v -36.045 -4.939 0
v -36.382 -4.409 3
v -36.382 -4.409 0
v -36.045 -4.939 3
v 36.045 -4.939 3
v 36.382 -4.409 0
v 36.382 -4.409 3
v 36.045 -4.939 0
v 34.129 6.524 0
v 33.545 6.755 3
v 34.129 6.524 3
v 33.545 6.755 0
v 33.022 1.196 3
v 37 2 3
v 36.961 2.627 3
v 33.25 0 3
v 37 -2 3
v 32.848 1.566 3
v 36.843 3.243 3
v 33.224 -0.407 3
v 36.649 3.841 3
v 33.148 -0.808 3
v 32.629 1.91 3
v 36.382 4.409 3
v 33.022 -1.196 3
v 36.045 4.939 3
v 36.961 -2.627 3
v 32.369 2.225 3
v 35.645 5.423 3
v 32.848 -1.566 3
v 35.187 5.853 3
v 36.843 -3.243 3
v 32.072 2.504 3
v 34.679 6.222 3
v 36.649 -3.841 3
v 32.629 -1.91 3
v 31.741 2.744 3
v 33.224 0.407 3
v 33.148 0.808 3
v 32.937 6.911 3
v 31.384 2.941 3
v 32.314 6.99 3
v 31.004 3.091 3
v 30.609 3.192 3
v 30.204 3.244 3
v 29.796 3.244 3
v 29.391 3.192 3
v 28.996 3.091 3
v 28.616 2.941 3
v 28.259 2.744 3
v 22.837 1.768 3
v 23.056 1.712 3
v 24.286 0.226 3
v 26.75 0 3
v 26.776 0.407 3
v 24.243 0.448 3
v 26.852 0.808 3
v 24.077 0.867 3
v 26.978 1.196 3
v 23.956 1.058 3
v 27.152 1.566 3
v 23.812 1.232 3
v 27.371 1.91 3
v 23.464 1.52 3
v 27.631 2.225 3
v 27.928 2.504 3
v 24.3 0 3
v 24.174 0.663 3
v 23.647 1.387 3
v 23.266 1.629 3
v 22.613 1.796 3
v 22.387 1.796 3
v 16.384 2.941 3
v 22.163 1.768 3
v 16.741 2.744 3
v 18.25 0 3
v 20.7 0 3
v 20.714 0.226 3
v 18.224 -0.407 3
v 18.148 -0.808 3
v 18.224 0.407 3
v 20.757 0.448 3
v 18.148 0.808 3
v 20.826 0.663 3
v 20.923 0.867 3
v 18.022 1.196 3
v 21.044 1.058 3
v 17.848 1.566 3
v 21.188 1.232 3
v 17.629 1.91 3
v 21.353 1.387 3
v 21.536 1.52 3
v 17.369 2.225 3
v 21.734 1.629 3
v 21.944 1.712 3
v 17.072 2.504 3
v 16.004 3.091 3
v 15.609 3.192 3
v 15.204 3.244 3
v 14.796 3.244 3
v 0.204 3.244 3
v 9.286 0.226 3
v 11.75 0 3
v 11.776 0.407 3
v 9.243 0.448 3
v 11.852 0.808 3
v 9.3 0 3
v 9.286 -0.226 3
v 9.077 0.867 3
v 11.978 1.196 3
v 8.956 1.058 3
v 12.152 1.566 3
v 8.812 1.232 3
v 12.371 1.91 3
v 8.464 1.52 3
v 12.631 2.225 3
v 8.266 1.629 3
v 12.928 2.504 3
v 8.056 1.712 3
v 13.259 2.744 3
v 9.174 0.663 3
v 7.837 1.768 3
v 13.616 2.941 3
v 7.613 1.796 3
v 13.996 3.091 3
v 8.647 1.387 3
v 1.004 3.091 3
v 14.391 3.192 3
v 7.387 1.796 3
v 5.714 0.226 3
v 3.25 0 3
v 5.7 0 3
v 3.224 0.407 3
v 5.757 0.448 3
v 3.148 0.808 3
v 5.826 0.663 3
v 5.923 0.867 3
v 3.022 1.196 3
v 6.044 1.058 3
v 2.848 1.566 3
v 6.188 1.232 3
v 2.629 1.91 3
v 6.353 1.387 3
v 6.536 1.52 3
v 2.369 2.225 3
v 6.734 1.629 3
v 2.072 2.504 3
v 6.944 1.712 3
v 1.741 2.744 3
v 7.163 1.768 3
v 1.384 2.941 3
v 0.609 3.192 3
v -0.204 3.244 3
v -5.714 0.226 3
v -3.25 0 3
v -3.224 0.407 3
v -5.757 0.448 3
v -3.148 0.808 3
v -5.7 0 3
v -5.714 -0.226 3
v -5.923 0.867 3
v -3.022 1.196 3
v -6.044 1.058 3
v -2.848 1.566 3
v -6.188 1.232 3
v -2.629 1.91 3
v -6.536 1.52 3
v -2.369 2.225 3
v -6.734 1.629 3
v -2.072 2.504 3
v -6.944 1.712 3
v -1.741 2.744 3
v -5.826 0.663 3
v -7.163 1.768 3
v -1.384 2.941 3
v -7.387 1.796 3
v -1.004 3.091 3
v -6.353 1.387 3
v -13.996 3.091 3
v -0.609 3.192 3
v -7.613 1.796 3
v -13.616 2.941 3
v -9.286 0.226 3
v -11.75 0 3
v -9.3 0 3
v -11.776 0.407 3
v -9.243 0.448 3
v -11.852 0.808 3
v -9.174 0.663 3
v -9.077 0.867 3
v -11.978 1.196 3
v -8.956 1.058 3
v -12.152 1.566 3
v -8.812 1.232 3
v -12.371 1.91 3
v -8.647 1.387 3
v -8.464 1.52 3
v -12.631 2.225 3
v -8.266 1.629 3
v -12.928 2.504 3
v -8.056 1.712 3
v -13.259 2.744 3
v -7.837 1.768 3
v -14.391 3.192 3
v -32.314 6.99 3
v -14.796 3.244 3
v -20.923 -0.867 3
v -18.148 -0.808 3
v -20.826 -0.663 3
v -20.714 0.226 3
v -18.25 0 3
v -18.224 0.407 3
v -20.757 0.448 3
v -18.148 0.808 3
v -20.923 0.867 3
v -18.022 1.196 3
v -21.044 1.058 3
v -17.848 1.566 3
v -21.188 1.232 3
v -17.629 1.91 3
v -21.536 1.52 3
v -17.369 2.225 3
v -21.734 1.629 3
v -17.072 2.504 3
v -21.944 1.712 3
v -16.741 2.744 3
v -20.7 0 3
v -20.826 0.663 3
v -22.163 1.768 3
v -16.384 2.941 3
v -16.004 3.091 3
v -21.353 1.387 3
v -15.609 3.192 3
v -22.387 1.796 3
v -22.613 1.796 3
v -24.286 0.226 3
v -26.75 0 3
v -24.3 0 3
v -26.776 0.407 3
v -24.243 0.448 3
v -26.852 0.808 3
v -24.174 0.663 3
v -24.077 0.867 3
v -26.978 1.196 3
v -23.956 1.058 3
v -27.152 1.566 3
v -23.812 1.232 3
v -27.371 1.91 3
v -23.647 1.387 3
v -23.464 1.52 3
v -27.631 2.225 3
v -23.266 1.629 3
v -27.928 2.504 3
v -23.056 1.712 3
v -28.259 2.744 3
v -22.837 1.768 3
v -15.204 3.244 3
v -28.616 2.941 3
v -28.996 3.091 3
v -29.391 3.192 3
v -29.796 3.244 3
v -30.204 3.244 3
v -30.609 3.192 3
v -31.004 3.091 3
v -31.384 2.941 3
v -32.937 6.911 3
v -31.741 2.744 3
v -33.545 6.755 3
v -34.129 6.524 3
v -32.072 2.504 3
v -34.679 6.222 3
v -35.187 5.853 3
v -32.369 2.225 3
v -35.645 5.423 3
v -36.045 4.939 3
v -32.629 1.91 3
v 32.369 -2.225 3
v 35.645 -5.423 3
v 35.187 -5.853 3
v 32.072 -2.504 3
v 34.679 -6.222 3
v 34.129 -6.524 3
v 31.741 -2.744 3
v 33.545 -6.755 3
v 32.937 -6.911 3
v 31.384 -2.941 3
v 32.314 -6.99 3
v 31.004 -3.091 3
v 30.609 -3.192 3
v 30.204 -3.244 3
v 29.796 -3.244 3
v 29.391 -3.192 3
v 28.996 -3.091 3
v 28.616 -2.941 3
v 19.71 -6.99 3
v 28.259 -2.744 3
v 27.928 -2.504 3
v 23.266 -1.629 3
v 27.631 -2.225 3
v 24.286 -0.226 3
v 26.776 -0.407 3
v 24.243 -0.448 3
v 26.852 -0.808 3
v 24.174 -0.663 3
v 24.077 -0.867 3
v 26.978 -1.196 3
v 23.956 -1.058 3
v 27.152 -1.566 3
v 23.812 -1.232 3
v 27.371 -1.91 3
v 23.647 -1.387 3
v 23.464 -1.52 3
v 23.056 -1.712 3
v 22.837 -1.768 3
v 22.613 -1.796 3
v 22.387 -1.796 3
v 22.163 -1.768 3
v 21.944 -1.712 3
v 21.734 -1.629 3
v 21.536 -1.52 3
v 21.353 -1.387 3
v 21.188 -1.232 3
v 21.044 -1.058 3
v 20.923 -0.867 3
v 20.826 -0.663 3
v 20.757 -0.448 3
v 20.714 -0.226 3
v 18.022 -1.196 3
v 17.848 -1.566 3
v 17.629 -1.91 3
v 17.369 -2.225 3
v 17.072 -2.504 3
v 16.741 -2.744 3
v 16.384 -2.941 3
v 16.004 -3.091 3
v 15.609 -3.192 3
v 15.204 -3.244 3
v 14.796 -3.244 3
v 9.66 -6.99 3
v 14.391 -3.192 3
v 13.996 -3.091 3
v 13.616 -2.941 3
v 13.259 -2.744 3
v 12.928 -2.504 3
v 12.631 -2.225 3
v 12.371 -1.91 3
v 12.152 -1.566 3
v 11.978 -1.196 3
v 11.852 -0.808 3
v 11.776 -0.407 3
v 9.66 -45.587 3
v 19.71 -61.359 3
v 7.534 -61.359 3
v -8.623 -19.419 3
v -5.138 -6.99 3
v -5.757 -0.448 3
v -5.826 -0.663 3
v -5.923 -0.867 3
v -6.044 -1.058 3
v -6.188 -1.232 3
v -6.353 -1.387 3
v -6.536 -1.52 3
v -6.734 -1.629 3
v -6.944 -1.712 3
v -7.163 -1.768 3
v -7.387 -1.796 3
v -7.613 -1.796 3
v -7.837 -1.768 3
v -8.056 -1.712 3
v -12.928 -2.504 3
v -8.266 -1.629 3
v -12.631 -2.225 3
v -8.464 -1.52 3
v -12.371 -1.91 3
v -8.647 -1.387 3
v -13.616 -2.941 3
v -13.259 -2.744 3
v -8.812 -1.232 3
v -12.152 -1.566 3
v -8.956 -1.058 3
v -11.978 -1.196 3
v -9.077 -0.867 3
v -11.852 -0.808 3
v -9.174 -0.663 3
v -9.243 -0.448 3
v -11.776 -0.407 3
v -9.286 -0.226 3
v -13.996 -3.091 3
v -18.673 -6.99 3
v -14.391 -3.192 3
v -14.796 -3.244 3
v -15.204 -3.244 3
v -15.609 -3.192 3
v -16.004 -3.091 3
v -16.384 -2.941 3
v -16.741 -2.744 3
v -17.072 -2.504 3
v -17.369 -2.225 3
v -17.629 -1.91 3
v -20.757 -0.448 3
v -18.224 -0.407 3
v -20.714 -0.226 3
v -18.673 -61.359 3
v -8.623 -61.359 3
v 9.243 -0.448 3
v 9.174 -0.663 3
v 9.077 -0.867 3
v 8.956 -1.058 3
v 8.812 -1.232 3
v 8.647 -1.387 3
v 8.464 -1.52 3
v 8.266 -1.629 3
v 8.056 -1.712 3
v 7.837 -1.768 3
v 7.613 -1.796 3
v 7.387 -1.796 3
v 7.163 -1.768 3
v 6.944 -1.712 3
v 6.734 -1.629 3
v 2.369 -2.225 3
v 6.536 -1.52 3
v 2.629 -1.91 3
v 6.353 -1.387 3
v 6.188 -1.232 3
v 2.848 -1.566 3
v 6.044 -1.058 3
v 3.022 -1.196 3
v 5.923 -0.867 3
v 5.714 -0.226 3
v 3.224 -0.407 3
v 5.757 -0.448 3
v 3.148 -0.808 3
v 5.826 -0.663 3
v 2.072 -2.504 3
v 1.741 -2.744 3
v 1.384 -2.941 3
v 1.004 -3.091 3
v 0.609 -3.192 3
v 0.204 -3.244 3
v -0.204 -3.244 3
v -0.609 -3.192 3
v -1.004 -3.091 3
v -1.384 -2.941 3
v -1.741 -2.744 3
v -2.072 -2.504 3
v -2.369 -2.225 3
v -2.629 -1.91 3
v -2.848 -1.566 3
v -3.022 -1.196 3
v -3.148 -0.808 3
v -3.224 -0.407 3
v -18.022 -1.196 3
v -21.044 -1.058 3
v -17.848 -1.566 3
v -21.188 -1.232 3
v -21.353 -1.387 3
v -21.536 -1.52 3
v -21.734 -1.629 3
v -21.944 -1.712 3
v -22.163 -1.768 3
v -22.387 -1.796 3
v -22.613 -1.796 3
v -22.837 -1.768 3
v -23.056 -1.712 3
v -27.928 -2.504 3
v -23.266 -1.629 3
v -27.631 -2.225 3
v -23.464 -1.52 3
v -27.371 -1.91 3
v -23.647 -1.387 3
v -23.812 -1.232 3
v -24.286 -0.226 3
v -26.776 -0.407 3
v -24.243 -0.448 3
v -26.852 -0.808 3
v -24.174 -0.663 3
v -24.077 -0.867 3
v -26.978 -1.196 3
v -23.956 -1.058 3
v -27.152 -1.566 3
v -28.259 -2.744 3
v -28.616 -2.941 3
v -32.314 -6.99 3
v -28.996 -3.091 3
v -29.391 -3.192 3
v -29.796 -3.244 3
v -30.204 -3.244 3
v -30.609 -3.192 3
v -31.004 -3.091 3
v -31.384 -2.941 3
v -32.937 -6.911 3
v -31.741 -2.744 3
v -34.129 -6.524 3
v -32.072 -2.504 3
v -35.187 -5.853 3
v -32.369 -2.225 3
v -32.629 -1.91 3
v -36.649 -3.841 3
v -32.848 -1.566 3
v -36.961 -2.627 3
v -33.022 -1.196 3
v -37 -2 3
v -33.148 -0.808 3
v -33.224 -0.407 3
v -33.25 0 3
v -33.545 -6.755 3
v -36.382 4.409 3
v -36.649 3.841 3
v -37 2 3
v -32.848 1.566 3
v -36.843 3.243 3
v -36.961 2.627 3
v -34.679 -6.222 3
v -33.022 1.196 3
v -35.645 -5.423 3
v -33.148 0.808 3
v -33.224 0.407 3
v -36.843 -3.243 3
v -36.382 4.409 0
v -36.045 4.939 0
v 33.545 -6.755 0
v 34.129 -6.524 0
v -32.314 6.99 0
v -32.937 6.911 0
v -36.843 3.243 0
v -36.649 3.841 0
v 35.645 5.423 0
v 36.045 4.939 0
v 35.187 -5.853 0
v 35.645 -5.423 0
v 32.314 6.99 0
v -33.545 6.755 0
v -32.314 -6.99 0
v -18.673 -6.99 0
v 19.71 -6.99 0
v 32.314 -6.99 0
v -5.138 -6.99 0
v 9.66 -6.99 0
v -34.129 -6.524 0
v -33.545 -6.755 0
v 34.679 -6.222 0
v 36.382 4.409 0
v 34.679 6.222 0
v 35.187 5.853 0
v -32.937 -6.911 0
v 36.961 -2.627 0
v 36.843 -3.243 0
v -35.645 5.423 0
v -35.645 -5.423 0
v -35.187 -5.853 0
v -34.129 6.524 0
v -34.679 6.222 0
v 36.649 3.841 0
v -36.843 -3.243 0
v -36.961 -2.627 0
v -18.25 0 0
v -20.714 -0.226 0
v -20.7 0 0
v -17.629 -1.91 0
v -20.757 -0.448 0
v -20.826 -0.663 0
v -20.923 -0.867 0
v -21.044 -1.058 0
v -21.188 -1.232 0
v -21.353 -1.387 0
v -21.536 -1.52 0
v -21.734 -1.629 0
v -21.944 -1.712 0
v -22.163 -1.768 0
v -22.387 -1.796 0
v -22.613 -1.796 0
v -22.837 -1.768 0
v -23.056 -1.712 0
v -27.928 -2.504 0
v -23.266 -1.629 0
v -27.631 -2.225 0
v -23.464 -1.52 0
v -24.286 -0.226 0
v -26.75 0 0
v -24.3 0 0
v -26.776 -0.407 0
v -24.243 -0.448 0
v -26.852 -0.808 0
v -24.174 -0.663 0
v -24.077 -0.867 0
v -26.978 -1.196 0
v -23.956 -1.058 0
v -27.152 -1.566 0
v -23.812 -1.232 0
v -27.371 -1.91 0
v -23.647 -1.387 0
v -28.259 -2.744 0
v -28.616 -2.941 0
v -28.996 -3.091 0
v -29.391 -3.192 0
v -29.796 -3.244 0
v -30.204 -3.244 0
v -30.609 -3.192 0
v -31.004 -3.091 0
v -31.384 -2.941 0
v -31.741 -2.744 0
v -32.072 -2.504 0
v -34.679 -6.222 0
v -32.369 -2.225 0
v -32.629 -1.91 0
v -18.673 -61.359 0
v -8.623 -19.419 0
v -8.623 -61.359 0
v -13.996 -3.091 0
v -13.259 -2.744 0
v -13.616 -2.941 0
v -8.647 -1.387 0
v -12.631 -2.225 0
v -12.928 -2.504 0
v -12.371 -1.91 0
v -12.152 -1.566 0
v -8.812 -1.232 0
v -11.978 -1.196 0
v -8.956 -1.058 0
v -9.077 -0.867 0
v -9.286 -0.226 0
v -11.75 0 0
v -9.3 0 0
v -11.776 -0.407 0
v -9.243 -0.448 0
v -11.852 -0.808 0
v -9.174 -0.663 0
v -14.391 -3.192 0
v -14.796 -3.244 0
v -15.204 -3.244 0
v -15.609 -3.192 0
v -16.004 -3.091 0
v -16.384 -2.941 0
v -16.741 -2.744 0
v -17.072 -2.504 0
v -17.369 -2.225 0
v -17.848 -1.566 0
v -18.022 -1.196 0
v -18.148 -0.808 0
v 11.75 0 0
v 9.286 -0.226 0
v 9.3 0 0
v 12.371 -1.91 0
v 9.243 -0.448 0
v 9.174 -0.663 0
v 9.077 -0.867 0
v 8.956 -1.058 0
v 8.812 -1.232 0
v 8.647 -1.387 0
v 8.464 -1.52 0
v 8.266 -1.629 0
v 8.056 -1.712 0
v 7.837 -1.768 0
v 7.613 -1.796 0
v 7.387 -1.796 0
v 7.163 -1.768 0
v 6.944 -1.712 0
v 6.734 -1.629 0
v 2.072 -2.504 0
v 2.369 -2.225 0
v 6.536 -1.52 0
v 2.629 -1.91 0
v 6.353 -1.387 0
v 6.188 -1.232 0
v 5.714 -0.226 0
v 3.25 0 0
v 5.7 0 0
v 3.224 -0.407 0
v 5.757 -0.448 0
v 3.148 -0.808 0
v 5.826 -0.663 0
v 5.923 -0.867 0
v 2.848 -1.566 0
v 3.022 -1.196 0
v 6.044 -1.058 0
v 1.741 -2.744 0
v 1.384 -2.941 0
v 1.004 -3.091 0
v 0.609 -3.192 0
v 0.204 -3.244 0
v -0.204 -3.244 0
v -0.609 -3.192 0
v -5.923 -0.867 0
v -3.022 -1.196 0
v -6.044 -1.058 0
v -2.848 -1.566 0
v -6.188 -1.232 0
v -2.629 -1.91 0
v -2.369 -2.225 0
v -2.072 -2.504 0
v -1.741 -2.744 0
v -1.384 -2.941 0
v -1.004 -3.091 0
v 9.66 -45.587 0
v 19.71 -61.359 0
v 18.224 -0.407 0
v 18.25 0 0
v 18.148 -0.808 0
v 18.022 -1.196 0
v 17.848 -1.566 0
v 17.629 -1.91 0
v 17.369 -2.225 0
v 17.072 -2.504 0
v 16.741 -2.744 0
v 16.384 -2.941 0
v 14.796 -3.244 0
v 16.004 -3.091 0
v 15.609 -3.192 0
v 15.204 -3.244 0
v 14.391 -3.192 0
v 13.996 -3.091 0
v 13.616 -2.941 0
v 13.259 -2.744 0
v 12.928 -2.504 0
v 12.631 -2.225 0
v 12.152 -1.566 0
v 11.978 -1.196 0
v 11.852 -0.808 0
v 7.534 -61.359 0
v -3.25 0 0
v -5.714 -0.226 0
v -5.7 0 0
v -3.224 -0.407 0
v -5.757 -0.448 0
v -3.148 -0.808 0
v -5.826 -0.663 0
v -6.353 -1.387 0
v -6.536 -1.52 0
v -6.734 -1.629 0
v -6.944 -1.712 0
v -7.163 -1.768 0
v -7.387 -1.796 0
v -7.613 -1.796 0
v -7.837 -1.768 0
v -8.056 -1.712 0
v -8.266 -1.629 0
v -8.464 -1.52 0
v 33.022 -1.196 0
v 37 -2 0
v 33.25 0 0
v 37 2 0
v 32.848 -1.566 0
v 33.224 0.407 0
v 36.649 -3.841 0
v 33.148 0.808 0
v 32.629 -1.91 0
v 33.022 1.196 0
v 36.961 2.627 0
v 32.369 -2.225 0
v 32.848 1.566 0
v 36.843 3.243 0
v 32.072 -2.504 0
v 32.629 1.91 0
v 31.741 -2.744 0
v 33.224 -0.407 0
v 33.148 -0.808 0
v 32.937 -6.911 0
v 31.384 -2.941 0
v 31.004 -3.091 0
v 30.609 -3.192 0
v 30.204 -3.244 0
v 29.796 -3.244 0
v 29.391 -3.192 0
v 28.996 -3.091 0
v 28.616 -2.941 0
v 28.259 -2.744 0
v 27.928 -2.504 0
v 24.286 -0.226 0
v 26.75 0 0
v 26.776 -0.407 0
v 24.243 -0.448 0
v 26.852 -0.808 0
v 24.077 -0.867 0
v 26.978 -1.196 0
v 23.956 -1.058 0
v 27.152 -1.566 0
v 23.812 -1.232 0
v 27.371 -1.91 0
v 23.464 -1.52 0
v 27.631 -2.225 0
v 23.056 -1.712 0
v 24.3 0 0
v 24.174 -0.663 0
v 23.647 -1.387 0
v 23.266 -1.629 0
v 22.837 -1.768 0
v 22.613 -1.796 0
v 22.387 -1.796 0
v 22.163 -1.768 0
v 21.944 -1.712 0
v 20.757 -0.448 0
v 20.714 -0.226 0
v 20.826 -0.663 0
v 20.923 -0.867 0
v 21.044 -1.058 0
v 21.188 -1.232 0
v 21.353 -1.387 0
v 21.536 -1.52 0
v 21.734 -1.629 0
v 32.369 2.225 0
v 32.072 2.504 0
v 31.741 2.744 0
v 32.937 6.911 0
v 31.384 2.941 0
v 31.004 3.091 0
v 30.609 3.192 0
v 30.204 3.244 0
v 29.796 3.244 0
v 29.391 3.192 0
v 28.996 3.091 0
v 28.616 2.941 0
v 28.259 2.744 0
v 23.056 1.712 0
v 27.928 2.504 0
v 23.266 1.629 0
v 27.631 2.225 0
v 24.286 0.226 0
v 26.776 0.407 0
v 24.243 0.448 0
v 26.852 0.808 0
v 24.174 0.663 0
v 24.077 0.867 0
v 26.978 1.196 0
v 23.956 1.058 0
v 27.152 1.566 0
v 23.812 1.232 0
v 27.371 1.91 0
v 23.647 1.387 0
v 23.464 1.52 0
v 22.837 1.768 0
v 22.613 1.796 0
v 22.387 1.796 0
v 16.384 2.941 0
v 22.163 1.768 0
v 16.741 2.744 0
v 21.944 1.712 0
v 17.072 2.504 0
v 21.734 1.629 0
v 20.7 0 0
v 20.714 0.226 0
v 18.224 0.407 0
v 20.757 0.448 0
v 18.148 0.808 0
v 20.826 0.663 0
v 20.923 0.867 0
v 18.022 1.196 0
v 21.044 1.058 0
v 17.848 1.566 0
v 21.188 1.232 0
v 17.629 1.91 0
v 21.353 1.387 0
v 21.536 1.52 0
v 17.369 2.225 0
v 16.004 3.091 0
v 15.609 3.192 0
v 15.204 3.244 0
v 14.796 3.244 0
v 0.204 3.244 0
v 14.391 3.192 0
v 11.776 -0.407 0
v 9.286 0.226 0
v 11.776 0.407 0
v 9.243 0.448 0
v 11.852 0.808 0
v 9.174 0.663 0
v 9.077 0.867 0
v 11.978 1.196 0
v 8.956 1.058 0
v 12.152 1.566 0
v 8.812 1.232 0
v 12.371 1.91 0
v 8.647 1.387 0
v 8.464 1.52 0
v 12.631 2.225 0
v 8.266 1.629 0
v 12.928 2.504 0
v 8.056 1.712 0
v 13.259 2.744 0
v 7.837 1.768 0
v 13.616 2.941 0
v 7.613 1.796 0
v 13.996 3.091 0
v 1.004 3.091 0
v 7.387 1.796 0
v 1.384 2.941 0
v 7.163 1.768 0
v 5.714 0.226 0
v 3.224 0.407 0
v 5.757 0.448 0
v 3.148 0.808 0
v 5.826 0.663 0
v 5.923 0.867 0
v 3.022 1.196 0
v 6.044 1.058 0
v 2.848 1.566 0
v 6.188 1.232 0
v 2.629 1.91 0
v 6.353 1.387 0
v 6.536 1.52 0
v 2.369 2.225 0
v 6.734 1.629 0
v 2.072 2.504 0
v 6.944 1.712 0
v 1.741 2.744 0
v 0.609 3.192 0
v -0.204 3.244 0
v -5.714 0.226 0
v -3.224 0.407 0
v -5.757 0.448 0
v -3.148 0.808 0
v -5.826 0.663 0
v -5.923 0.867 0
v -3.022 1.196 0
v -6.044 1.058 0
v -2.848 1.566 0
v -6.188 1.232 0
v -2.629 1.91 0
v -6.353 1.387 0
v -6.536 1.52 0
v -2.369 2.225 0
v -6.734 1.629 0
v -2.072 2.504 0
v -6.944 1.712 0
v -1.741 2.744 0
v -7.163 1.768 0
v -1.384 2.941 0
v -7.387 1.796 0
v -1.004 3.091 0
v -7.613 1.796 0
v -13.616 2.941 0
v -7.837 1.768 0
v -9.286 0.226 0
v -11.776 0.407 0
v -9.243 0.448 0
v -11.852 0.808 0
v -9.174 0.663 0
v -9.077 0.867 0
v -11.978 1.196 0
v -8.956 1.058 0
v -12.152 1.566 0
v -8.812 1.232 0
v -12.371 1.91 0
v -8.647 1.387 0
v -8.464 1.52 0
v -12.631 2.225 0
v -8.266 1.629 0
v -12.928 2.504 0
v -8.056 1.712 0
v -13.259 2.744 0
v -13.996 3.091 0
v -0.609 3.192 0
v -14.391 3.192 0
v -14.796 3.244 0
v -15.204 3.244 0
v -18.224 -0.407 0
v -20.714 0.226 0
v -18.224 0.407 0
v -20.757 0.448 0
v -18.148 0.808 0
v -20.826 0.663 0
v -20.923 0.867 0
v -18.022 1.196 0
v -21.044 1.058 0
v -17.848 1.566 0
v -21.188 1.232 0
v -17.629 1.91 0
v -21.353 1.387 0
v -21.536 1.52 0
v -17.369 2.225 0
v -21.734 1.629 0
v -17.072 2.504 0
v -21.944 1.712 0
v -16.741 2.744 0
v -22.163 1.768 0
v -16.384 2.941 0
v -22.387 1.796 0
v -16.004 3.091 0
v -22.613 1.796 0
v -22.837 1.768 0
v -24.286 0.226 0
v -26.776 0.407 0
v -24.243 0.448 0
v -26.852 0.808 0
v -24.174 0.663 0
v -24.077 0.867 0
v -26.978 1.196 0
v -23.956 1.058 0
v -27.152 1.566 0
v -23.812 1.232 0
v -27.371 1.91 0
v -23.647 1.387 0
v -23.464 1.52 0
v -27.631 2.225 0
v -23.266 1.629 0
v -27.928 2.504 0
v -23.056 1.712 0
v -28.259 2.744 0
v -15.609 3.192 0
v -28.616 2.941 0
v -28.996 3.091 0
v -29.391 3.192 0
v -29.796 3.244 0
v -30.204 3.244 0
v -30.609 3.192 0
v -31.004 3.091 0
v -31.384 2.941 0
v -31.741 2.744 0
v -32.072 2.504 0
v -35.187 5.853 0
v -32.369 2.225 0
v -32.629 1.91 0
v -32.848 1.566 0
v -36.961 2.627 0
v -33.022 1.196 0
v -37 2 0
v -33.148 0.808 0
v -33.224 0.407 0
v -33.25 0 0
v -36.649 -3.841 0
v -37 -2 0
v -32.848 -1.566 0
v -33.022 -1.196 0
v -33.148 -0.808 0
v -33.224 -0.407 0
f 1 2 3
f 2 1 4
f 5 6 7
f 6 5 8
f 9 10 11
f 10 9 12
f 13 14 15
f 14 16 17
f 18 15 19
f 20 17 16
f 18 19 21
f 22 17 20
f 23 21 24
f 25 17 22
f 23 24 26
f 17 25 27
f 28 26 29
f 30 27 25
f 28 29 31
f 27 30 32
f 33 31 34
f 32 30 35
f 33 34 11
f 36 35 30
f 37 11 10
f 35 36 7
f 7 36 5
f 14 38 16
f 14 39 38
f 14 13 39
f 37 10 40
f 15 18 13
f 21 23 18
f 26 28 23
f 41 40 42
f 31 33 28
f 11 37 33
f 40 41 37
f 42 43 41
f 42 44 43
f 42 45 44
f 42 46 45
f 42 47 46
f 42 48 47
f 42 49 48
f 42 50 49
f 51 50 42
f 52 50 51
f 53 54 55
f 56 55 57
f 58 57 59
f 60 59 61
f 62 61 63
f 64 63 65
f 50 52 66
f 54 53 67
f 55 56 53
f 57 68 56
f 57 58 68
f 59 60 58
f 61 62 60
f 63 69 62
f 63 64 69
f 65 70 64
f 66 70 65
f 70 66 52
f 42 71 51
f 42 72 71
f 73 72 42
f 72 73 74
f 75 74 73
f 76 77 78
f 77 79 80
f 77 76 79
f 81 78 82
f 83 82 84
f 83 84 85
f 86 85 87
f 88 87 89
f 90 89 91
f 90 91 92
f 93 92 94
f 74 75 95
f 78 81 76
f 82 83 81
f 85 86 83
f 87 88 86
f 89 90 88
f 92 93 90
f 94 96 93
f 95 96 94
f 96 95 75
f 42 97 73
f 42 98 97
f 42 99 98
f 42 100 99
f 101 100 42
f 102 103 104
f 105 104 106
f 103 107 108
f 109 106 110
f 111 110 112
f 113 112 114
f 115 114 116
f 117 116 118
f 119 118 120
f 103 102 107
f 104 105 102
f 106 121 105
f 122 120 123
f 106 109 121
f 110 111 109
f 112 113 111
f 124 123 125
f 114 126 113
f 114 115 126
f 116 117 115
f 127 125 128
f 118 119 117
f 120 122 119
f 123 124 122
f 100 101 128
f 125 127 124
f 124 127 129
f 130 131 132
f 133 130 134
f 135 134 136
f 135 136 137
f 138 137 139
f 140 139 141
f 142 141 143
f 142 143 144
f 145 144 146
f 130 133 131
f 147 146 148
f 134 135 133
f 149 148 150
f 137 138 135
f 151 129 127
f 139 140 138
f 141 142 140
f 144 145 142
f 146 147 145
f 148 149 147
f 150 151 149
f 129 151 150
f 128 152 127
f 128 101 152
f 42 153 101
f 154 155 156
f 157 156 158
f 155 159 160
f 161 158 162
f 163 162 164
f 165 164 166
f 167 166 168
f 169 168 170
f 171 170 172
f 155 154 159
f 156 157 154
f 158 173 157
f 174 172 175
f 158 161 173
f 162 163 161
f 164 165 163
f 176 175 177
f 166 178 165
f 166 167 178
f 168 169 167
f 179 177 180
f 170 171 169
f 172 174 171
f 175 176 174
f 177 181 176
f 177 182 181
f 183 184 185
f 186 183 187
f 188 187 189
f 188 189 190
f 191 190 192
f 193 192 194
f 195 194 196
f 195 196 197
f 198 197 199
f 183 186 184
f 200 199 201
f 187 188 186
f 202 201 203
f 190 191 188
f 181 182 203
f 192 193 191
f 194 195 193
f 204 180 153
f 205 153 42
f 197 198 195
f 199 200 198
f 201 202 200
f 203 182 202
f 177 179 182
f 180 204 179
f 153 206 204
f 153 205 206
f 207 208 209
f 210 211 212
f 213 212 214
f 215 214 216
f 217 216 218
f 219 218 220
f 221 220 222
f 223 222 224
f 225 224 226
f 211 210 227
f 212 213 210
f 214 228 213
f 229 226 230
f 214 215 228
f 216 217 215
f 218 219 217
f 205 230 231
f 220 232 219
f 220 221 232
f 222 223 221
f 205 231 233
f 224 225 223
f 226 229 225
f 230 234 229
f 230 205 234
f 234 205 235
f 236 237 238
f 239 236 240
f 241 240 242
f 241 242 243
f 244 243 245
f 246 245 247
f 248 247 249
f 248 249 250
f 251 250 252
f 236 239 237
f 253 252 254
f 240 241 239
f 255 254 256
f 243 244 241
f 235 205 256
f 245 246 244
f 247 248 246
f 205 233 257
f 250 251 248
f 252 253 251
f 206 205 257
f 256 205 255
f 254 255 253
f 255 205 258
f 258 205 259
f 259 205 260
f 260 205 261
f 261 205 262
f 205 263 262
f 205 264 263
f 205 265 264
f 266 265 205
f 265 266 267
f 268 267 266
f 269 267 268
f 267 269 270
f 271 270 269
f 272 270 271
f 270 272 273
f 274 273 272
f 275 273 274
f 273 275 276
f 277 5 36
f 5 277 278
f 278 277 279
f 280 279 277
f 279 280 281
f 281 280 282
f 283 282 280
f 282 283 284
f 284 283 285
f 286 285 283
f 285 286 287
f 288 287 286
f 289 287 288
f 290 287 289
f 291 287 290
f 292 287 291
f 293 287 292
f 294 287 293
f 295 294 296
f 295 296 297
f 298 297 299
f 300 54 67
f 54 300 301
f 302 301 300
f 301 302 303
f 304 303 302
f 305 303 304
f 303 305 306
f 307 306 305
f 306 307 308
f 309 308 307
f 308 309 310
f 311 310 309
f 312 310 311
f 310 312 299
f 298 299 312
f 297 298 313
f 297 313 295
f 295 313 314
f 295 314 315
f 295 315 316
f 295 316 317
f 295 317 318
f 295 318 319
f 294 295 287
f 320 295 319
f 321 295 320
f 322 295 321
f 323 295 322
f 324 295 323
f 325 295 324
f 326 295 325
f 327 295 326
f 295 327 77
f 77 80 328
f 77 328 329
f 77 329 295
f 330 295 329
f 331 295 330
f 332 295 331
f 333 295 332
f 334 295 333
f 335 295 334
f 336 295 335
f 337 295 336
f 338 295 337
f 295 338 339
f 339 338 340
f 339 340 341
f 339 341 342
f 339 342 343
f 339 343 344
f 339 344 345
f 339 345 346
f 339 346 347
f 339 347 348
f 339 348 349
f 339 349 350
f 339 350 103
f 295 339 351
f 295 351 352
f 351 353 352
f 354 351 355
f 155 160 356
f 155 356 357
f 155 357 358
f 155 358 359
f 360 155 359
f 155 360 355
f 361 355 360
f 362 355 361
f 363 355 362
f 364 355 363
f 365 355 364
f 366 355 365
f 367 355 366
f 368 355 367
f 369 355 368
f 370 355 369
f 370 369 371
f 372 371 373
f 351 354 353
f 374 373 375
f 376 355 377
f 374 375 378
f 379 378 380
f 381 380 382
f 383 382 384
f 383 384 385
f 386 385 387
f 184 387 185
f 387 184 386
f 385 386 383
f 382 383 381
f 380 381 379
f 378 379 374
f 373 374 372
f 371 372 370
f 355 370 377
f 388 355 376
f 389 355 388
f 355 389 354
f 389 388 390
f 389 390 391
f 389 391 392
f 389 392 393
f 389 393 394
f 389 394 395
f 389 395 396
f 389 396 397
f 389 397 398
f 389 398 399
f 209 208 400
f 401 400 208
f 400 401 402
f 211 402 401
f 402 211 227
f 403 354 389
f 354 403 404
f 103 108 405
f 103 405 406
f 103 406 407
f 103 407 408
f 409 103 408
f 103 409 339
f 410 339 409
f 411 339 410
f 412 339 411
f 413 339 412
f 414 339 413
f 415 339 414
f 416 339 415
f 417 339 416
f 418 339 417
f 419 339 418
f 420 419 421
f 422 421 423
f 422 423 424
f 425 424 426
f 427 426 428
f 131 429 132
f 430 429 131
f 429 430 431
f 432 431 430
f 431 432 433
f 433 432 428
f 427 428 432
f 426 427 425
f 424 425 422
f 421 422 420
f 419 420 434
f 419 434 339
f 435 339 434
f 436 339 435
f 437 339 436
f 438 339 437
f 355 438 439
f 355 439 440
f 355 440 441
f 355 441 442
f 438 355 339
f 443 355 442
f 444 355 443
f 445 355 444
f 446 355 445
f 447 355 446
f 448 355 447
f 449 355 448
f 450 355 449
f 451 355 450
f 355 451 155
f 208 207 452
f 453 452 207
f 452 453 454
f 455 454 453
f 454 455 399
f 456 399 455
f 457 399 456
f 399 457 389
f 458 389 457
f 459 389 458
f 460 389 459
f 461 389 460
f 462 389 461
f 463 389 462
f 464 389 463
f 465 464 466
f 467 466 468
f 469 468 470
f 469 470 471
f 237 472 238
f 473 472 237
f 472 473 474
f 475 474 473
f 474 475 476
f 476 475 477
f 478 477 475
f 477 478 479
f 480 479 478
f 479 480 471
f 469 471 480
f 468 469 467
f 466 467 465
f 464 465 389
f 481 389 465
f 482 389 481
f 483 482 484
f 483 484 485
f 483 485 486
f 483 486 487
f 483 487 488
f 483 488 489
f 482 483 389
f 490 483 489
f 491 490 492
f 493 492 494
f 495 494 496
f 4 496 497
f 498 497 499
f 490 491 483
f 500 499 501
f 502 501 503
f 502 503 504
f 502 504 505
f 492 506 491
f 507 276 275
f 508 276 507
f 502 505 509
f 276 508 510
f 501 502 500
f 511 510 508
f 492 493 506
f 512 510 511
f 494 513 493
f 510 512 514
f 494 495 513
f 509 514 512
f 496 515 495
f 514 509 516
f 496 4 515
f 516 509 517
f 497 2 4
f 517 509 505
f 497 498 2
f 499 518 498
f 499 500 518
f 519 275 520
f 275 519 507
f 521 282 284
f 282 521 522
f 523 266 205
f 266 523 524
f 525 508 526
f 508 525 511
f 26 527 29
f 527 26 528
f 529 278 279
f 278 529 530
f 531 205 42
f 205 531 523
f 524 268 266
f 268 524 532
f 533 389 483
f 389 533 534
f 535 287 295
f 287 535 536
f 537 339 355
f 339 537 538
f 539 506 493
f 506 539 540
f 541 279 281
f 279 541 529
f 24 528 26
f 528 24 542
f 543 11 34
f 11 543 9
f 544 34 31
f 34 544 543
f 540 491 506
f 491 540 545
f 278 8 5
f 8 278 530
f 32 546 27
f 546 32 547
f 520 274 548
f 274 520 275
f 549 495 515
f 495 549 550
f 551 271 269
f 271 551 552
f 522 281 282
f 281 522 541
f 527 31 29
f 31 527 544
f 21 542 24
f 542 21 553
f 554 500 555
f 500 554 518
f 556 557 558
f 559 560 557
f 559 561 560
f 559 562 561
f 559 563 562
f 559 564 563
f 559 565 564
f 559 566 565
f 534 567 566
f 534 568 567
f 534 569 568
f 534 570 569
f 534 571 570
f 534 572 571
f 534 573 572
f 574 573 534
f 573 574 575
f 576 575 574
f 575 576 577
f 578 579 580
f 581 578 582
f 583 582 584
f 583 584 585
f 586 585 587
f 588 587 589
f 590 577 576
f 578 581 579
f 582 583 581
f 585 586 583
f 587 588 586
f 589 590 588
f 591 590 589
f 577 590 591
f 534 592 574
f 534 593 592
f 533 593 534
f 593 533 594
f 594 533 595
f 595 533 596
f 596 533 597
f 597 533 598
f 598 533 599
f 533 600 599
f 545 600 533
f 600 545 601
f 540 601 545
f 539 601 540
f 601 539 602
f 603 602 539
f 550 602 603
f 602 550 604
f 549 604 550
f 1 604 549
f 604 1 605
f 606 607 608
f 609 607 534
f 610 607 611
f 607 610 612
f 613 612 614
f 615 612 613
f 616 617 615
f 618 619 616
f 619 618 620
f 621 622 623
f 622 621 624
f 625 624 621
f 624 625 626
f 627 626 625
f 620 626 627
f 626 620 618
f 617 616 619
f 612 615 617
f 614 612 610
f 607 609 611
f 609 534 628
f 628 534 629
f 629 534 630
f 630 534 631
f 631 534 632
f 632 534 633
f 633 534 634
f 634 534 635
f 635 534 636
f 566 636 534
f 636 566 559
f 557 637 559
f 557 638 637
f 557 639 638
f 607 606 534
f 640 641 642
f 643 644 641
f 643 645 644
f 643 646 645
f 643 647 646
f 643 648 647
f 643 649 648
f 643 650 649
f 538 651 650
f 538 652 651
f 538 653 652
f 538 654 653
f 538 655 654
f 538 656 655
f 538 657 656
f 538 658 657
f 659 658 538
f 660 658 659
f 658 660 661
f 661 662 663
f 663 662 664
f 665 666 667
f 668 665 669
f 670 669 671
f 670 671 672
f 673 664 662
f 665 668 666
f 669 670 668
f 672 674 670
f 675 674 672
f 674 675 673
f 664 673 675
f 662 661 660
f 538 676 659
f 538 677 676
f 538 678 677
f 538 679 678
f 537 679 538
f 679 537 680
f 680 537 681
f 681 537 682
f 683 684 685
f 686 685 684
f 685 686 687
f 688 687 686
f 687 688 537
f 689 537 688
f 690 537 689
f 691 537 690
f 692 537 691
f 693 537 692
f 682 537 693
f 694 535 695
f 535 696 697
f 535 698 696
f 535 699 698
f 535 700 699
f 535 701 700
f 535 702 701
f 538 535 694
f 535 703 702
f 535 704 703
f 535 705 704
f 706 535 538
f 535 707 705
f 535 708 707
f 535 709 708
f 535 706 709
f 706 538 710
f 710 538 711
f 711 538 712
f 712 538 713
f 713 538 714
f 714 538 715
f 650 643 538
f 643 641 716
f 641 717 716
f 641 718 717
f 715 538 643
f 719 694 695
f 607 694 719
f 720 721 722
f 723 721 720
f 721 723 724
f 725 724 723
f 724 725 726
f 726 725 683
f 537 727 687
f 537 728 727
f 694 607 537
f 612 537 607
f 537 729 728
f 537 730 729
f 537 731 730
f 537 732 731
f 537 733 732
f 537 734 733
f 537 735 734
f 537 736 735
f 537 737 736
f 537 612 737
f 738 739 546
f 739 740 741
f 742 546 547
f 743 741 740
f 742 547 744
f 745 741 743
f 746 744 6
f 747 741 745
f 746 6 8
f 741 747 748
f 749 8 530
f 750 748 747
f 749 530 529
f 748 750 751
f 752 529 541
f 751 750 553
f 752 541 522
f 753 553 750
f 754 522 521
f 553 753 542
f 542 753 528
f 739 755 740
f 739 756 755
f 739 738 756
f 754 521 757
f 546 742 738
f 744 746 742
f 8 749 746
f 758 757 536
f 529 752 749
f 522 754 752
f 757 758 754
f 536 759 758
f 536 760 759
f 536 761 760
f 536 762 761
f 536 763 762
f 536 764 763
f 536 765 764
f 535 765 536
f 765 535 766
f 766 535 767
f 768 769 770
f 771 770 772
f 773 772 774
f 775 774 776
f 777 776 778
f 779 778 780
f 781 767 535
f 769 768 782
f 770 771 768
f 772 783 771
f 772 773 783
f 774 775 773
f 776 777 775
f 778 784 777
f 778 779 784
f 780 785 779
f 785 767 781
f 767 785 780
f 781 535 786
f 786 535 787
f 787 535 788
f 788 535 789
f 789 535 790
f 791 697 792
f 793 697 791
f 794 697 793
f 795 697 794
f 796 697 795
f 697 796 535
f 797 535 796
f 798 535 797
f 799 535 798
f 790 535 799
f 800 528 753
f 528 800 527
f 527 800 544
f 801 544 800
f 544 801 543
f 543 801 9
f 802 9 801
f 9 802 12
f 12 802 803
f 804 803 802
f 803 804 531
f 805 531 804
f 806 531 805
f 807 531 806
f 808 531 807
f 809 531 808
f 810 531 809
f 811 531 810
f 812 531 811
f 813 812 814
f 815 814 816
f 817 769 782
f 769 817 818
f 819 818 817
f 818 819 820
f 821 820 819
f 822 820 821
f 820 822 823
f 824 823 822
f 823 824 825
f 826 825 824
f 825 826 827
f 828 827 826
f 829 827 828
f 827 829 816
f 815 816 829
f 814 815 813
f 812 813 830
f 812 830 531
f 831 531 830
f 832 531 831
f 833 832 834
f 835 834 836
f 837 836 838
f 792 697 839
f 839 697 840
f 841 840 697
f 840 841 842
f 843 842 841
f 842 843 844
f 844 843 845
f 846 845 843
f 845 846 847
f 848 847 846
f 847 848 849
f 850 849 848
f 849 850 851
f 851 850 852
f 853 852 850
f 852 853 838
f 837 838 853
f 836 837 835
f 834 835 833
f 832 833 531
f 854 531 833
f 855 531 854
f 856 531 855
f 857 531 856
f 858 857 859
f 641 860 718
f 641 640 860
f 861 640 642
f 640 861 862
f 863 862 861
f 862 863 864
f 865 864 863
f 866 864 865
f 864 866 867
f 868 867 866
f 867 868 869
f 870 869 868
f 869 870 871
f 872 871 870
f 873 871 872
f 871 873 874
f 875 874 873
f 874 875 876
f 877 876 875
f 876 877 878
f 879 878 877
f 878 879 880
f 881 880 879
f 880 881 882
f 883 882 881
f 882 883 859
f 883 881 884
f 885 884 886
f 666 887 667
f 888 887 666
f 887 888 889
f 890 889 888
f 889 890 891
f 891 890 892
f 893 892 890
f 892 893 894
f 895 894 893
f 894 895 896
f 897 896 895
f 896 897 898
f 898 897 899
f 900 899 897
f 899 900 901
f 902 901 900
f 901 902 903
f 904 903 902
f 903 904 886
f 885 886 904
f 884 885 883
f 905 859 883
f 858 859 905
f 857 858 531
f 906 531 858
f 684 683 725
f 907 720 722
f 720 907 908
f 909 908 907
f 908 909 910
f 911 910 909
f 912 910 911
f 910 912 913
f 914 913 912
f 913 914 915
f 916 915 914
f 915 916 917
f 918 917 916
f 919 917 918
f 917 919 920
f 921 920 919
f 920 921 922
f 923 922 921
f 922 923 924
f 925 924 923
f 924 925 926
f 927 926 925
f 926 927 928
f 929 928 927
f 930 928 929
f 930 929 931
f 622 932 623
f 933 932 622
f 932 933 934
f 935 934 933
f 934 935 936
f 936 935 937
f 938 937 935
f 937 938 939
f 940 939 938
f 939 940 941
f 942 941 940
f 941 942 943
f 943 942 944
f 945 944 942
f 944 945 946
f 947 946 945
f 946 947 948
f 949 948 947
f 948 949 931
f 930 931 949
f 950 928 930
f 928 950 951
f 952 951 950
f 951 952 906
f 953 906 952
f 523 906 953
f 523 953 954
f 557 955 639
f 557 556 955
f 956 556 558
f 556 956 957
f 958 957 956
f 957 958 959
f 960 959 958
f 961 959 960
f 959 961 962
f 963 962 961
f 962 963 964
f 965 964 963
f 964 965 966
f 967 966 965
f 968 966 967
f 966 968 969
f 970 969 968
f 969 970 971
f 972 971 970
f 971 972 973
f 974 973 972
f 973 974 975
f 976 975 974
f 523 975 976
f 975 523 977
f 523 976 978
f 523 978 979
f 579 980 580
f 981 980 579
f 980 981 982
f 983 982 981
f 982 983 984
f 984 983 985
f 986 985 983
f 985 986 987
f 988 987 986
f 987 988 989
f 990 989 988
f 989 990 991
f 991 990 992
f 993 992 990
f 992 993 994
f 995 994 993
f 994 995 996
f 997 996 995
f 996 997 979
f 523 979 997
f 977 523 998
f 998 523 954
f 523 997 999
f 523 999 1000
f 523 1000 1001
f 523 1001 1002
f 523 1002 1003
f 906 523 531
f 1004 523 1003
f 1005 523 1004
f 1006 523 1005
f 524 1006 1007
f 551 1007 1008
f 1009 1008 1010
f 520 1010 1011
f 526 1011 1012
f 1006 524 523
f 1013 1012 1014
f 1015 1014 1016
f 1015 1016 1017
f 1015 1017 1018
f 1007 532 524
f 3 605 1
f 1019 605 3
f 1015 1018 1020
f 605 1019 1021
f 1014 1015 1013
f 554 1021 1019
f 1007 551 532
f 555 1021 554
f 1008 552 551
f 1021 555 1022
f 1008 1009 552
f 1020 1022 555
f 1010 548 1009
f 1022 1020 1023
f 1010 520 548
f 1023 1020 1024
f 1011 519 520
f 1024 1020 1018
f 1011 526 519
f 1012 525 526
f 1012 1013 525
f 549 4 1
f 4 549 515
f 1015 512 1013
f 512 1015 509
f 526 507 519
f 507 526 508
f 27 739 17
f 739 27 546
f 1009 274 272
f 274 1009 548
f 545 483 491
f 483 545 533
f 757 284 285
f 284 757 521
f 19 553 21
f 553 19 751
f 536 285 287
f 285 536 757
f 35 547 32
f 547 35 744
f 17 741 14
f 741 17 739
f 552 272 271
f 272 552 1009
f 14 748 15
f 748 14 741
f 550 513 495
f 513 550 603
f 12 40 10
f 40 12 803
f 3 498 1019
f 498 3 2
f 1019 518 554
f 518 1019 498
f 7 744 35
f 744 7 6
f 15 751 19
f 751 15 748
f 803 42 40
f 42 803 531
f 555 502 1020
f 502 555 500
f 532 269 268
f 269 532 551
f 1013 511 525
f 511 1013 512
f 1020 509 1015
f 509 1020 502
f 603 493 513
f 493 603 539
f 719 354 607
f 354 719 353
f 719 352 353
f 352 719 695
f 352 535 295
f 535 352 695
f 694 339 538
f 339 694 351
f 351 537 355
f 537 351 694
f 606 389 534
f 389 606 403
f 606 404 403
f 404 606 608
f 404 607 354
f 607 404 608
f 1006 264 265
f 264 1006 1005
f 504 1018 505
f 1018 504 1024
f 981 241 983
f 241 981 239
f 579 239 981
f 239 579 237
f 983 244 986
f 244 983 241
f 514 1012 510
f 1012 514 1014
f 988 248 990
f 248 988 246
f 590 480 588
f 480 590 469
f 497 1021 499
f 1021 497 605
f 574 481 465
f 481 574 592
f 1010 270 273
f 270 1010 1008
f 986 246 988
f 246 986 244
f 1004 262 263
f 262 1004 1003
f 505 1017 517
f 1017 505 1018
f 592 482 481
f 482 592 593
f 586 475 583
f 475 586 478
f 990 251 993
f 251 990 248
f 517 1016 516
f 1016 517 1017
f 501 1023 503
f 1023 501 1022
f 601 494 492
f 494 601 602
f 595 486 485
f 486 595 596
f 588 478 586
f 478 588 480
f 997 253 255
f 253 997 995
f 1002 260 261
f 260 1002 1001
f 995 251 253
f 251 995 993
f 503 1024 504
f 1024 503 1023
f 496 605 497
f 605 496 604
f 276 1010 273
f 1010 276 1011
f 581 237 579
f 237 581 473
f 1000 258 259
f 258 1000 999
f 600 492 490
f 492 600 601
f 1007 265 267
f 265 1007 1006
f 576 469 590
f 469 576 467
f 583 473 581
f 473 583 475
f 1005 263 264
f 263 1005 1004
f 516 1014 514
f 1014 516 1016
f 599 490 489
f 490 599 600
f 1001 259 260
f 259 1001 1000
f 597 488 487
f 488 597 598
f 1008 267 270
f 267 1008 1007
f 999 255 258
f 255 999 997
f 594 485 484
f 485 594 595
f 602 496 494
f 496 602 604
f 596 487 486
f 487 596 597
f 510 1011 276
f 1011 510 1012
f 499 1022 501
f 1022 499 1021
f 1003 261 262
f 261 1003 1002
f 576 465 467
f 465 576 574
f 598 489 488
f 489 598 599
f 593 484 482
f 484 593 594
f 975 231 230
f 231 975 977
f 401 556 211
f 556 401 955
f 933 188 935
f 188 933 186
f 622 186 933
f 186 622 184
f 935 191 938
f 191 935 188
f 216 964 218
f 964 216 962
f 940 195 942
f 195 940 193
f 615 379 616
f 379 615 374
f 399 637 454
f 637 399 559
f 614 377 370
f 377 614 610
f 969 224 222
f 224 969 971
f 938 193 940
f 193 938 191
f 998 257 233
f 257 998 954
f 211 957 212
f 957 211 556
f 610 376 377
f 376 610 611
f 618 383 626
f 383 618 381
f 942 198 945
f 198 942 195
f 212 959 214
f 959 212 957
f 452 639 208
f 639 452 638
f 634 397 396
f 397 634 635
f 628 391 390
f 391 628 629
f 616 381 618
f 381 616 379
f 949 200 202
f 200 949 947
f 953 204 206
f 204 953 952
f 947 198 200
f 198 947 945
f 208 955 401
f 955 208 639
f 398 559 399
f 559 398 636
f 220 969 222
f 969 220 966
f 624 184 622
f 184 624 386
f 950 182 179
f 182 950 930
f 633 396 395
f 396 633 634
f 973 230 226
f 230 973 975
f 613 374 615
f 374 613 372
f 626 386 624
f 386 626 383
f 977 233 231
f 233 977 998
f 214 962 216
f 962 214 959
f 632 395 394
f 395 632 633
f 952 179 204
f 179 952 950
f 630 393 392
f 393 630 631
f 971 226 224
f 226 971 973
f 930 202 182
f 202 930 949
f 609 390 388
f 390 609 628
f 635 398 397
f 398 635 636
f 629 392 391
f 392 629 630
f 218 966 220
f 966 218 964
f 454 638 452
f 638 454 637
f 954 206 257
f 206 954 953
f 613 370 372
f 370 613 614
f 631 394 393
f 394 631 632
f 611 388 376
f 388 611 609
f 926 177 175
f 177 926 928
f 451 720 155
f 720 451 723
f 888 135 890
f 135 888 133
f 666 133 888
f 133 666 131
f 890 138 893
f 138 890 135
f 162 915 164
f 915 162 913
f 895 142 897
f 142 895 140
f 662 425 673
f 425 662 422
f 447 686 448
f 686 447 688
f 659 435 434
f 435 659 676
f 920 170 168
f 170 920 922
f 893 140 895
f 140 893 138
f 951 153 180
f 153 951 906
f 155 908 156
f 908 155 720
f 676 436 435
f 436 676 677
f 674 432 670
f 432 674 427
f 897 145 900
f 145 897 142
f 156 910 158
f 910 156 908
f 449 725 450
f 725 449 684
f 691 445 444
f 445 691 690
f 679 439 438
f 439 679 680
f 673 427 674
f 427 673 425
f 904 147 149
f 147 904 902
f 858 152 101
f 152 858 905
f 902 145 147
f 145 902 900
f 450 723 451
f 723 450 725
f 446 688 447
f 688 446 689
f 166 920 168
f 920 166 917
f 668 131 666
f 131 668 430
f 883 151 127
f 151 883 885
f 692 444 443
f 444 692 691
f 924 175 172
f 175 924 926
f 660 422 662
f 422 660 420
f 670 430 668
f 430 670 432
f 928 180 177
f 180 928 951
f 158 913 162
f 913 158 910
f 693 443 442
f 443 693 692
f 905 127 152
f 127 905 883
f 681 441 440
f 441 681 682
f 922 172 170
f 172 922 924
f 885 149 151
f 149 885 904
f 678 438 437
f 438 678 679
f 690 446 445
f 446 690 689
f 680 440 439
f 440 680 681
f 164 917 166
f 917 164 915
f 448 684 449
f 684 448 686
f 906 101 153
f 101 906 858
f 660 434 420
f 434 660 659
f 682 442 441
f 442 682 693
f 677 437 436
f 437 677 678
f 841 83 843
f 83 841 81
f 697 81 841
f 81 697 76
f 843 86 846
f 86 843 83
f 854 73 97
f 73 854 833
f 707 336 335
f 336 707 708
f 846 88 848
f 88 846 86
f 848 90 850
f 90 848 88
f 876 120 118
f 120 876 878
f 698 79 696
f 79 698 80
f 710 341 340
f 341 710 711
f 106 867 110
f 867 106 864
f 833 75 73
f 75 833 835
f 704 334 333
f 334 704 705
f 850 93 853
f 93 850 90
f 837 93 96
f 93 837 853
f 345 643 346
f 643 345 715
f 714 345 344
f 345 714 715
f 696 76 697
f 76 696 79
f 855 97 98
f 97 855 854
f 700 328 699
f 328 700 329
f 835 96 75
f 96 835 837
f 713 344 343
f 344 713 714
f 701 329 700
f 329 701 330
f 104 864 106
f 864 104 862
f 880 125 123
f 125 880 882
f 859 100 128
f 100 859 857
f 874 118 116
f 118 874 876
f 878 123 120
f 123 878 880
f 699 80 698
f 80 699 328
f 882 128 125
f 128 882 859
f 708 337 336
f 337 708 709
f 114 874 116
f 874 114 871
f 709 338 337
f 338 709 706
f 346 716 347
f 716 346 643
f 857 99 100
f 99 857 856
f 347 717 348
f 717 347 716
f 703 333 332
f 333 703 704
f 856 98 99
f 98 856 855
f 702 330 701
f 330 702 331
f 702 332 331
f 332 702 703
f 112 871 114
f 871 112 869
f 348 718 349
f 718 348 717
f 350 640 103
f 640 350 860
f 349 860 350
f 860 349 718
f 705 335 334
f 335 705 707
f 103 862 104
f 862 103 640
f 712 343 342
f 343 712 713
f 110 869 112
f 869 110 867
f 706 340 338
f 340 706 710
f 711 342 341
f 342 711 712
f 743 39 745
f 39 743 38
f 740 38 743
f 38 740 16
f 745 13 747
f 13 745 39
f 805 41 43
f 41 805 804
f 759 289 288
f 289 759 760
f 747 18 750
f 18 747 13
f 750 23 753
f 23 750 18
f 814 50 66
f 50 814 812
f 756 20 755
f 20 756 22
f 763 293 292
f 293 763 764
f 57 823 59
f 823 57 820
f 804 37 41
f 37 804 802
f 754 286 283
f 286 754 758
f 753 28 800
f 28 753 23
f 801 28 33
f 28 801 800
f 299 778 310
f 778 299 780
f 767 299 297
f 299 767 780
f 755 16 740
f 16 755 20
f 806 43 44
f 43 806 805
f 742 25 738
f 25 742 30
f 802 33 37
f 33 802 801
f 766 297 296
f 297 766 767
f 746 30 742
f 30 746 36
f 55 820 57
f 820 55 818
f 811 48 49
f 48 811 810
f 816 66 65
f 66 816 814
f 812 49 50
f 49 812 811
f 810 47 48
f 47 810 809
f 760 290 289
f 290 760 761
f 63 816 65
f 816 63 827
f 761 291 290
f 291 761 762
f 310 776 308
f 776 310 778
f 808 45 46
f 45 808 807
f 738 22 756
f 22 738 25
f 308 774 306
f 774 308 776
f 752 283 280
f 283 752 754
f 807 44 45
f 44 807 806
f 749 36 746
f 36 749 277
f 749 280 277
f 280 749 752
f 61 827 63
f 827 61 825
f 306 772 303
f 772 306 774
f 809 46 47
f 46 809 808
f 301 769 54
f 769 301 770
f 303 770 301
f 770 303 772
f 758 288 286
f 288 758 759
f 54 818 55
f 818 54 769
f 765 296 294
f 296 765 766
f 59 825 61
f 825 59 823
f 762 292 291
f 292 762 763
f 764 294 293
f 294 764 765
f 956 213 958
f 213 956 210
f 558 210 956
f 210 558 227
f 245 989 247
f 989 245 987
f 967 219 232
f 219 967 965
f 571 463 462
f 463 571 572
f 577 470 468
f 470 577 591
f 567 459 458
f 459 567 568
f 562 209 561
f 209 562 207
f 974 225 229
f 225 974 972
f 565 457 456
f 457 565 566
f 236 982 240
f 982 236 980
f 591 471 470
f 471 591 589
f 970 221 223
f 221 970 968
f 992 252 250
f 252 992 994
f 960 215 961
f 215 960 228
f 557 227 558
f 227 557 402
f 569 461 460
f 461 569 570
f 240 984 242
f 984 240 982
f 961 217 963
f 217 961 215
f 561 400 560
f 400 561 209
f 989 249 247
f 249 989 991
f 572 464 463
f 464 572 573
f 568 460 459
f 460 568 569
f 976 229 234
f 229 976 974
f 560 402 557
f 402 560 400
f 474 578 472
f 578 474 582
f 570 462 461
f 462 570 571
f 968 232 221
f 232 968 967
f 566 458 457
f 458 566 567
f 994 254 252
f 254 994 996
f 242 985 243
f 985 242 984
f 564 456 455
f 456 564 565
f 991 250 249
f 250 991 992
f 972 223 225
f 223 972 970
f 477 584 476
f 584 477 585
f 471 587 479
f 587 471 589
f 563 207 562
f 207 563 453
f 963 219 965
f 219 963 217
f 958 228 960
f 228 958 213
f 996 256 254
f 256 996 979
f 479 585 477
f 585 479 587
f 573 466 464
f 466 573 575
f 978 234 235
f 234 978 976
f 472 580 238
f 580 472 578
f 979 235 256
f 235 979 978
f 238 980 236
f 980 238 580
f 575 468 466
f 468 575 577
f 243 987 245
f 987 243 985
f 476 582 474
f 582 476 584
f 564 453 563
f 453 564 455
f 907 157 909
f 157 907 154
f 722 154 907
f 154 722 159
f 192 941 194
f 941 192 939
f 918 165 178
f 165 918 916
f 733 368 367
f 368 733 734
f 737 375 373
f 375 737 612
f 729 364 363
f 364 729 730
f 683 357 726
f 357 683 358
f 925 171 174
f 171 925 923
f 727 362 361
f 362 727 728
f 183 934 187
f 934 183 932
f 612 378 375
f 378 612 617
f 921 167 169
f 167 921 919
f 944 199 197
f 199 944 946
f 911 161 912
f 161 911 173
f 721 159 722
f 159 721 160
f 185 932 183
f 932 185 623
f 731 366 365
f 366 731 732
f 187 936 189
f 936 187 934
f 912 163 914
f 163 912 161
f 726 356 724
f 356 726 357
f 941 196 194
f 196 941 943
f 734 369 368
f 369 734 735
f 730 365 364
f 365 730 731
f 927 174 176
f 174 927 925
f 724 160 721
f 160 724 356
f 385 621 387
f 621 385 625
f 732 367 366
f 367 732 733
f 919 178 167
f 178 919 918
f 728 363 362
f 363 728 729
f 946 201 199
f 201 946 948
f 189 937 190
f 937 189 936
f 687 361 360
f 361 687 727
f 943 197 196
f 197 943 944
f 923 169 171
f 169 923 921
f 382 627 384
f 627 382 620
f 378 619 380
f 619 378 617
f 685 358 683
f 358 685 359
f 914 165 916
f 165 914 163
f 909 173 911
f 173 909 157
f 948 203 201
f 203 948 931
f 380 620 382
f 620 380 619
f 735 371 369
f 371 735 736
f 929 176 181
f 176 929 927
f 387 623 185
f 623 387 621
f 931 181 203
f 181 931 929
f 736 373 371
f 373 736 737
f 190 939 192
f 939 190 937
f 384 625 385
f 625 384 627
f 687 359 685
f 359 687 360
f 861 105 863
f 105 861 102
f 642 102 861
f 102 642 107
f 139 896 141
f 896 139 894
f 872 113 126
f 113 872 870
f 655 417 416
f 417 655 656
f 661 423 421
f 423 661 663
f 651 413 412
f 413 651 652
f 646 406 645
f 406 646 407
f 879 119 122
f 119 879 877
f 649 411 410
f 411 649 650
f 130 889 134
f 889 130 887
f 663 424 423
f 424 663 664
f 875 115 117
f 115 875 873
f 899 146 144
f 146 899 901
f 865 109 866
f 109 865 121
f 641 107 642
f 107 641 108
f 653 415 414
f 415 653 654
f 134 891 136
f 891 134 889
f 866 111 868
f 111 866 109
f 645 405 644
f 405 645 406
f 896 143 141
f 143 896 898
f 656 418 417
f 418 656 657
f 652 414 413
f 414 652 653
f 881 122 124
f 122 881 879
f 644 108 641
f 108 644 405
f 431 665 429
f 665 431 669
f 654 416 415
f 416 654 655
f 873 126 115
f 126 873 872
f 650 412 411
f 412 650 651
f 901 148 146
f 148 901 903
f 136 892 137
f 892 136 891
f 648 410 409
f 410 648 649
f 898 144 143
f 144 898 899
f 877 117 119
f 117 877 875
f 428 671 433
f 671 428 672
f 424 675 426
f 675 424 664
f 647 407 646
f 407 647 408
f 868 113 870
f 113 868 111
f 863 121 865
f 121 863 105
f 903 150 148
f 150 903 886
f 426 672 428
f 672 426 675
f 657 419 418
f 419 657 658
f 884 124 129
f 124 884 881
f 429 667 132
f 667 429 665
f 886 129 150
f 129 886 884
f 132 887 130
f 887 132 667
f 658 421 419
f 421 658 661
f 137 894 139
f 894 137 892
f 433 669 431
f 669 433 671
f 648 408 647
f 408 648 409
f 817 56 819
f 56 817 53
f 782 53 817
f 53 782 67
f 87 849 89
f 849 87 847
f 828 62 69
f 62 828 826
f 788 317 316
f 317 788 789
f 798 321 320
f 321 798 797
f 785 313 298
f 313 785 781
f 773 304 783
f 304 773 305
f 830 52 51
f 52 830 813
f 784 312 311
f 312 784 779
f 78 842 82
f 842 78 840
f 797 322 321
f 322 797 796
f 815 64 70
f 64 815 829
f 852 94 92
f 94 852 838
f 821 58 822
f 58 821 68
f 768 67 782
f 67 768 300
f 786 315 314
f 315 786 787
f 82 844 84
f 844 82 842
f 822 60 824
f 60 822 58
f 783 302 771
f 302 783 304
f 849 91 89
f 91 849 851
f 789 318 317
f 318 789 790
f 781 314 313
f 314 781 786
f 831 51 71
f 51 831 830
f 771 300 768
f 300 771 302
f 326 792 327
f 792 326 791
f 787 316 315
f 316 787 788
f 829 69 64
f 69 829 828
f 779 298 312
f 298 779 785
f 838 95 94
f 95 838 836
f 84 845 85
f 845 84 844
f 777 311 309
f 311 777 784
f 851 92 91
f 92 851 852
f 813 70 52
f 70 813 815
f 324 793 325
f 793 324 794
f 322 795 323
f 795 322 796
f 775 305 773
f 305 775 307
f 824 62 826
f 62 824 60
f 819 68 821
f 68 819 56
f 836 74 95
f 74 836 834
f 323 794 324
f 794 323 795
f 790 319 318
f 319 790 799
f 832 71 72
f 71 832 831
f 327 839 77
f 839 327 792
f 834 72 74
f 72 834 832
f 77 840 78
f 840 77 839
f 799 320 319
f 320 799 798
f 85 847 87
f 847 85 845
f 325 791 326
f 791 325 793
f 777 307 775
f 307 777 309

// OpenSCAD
$fn = 50;


difference() {
	union() {
		hull() {
			translate(v = [-32.0000000000, 2.0000000000, 0]) {
				cylinder(h = 3, r = 5);
			}
			translate(v = [32.0000000000, 2.0000000000, 0]) {
				cylinder(h = 3, r = 5);
			}
			translate(v = [-32.0000000000, -2.0000000000, 0]) {
				cylinder(h = 3, r = 5);
			}
			translate(v = [32.0000000000, -2.0000000000, 0]) {
				cylinder(h = 3, r = 5);
			}
		}
		translate(v = [0, -5, 0]) {
			linear_extrude(height = 3) {
				text(font = "DejaVu Sans Mono:style=Bold", halign = "center", size = 57.0000000000, text = "N", valign = "top");
			}
		}
	}
	union() {
		translate(v = [-30.0000000000, 0.0000000000, 0]) {
			translate(v = [0, 0, -100]) {
				cylinder(h = 200, r = 3.2500000000);
			}
		}
		translate(v = [-15.0000000000, 0.0000000000, 0]) {
			translate(v = [0, 0, -100]) {
				cylinder(h = 200, r = 3.2500000000);
			}
		}
		translate(v = [0, 0, -100]) {
			cylinder(h = 200, r = 3.2500000000);
		}
		translate(v = [15.0000000000, 0.0000000000, 0]) {
			translate(v = [0, 0, -100]) {
				cylinder(h = 200, r = 3.2500000000);
			}
		}
		translate(v = [30.0000000000, 0.0000000000, 0]) {
			translate(v = [0, 0, -100]) {
				cylinder(h = 200, r = 3.2500000000);
			}
		}
		translate(v = [-30.0000000000, 0.0000000000, 0]) {
			translate(v = [0, 0, -100]) {
				cylinder(h = 200, r = 1.8000000000);
			}
		}
		translate(v = [-22.5000000000, 0.0000000000, 0]) {
			translate(v = [0, 0, -100]) {
				cylinder(h = 200, r = 1.8000000000);
			}
		}
		translate(v = [-15.0000000000, 0.0000000000, 0]) {
			translate(v = [0, 0, -100]) {
				cylinder(h = 200, r = 1.8000000000);
			}
		}
		translate(v = [-7.5000000000, 0.0000000000, 0]) {
			translate(v = [0, 0, -100]) {
				cylinder(h = 200, r = 1.8000000000);
			}
		}
		translate(v = [0, 0, -100]) {
			cylinder(h = 200, r = 1.8000000000);
		}
		translate(v = [7.5000000000, 0.0000000000, 0]) {
			translate(v = [0, 0, -100]) {
				cylinder(h = 200, r = 1.8000000000);
			}
		}
		translate(v = [15.0000000000, 0.0000000000, 0]) {
			translate(v = [0, 0, -100]) {
				cylinder(h = 200, r = 1.8000000000);
			}
		}
		translate(v = [22.5000000000, 0.0000000000, 0]) {
			translate(v = [0, 0, -100]) {
				cylinder(h = 200, r = 1.8000000000);
			}
		}
		translate(v = [30.0000000000, 0.0000000000, 0]) {
			translate(v = [0, 0, -100]) {
				cylinder(h = 200, r = 1.8000000000);
			}
		}
	}
}
